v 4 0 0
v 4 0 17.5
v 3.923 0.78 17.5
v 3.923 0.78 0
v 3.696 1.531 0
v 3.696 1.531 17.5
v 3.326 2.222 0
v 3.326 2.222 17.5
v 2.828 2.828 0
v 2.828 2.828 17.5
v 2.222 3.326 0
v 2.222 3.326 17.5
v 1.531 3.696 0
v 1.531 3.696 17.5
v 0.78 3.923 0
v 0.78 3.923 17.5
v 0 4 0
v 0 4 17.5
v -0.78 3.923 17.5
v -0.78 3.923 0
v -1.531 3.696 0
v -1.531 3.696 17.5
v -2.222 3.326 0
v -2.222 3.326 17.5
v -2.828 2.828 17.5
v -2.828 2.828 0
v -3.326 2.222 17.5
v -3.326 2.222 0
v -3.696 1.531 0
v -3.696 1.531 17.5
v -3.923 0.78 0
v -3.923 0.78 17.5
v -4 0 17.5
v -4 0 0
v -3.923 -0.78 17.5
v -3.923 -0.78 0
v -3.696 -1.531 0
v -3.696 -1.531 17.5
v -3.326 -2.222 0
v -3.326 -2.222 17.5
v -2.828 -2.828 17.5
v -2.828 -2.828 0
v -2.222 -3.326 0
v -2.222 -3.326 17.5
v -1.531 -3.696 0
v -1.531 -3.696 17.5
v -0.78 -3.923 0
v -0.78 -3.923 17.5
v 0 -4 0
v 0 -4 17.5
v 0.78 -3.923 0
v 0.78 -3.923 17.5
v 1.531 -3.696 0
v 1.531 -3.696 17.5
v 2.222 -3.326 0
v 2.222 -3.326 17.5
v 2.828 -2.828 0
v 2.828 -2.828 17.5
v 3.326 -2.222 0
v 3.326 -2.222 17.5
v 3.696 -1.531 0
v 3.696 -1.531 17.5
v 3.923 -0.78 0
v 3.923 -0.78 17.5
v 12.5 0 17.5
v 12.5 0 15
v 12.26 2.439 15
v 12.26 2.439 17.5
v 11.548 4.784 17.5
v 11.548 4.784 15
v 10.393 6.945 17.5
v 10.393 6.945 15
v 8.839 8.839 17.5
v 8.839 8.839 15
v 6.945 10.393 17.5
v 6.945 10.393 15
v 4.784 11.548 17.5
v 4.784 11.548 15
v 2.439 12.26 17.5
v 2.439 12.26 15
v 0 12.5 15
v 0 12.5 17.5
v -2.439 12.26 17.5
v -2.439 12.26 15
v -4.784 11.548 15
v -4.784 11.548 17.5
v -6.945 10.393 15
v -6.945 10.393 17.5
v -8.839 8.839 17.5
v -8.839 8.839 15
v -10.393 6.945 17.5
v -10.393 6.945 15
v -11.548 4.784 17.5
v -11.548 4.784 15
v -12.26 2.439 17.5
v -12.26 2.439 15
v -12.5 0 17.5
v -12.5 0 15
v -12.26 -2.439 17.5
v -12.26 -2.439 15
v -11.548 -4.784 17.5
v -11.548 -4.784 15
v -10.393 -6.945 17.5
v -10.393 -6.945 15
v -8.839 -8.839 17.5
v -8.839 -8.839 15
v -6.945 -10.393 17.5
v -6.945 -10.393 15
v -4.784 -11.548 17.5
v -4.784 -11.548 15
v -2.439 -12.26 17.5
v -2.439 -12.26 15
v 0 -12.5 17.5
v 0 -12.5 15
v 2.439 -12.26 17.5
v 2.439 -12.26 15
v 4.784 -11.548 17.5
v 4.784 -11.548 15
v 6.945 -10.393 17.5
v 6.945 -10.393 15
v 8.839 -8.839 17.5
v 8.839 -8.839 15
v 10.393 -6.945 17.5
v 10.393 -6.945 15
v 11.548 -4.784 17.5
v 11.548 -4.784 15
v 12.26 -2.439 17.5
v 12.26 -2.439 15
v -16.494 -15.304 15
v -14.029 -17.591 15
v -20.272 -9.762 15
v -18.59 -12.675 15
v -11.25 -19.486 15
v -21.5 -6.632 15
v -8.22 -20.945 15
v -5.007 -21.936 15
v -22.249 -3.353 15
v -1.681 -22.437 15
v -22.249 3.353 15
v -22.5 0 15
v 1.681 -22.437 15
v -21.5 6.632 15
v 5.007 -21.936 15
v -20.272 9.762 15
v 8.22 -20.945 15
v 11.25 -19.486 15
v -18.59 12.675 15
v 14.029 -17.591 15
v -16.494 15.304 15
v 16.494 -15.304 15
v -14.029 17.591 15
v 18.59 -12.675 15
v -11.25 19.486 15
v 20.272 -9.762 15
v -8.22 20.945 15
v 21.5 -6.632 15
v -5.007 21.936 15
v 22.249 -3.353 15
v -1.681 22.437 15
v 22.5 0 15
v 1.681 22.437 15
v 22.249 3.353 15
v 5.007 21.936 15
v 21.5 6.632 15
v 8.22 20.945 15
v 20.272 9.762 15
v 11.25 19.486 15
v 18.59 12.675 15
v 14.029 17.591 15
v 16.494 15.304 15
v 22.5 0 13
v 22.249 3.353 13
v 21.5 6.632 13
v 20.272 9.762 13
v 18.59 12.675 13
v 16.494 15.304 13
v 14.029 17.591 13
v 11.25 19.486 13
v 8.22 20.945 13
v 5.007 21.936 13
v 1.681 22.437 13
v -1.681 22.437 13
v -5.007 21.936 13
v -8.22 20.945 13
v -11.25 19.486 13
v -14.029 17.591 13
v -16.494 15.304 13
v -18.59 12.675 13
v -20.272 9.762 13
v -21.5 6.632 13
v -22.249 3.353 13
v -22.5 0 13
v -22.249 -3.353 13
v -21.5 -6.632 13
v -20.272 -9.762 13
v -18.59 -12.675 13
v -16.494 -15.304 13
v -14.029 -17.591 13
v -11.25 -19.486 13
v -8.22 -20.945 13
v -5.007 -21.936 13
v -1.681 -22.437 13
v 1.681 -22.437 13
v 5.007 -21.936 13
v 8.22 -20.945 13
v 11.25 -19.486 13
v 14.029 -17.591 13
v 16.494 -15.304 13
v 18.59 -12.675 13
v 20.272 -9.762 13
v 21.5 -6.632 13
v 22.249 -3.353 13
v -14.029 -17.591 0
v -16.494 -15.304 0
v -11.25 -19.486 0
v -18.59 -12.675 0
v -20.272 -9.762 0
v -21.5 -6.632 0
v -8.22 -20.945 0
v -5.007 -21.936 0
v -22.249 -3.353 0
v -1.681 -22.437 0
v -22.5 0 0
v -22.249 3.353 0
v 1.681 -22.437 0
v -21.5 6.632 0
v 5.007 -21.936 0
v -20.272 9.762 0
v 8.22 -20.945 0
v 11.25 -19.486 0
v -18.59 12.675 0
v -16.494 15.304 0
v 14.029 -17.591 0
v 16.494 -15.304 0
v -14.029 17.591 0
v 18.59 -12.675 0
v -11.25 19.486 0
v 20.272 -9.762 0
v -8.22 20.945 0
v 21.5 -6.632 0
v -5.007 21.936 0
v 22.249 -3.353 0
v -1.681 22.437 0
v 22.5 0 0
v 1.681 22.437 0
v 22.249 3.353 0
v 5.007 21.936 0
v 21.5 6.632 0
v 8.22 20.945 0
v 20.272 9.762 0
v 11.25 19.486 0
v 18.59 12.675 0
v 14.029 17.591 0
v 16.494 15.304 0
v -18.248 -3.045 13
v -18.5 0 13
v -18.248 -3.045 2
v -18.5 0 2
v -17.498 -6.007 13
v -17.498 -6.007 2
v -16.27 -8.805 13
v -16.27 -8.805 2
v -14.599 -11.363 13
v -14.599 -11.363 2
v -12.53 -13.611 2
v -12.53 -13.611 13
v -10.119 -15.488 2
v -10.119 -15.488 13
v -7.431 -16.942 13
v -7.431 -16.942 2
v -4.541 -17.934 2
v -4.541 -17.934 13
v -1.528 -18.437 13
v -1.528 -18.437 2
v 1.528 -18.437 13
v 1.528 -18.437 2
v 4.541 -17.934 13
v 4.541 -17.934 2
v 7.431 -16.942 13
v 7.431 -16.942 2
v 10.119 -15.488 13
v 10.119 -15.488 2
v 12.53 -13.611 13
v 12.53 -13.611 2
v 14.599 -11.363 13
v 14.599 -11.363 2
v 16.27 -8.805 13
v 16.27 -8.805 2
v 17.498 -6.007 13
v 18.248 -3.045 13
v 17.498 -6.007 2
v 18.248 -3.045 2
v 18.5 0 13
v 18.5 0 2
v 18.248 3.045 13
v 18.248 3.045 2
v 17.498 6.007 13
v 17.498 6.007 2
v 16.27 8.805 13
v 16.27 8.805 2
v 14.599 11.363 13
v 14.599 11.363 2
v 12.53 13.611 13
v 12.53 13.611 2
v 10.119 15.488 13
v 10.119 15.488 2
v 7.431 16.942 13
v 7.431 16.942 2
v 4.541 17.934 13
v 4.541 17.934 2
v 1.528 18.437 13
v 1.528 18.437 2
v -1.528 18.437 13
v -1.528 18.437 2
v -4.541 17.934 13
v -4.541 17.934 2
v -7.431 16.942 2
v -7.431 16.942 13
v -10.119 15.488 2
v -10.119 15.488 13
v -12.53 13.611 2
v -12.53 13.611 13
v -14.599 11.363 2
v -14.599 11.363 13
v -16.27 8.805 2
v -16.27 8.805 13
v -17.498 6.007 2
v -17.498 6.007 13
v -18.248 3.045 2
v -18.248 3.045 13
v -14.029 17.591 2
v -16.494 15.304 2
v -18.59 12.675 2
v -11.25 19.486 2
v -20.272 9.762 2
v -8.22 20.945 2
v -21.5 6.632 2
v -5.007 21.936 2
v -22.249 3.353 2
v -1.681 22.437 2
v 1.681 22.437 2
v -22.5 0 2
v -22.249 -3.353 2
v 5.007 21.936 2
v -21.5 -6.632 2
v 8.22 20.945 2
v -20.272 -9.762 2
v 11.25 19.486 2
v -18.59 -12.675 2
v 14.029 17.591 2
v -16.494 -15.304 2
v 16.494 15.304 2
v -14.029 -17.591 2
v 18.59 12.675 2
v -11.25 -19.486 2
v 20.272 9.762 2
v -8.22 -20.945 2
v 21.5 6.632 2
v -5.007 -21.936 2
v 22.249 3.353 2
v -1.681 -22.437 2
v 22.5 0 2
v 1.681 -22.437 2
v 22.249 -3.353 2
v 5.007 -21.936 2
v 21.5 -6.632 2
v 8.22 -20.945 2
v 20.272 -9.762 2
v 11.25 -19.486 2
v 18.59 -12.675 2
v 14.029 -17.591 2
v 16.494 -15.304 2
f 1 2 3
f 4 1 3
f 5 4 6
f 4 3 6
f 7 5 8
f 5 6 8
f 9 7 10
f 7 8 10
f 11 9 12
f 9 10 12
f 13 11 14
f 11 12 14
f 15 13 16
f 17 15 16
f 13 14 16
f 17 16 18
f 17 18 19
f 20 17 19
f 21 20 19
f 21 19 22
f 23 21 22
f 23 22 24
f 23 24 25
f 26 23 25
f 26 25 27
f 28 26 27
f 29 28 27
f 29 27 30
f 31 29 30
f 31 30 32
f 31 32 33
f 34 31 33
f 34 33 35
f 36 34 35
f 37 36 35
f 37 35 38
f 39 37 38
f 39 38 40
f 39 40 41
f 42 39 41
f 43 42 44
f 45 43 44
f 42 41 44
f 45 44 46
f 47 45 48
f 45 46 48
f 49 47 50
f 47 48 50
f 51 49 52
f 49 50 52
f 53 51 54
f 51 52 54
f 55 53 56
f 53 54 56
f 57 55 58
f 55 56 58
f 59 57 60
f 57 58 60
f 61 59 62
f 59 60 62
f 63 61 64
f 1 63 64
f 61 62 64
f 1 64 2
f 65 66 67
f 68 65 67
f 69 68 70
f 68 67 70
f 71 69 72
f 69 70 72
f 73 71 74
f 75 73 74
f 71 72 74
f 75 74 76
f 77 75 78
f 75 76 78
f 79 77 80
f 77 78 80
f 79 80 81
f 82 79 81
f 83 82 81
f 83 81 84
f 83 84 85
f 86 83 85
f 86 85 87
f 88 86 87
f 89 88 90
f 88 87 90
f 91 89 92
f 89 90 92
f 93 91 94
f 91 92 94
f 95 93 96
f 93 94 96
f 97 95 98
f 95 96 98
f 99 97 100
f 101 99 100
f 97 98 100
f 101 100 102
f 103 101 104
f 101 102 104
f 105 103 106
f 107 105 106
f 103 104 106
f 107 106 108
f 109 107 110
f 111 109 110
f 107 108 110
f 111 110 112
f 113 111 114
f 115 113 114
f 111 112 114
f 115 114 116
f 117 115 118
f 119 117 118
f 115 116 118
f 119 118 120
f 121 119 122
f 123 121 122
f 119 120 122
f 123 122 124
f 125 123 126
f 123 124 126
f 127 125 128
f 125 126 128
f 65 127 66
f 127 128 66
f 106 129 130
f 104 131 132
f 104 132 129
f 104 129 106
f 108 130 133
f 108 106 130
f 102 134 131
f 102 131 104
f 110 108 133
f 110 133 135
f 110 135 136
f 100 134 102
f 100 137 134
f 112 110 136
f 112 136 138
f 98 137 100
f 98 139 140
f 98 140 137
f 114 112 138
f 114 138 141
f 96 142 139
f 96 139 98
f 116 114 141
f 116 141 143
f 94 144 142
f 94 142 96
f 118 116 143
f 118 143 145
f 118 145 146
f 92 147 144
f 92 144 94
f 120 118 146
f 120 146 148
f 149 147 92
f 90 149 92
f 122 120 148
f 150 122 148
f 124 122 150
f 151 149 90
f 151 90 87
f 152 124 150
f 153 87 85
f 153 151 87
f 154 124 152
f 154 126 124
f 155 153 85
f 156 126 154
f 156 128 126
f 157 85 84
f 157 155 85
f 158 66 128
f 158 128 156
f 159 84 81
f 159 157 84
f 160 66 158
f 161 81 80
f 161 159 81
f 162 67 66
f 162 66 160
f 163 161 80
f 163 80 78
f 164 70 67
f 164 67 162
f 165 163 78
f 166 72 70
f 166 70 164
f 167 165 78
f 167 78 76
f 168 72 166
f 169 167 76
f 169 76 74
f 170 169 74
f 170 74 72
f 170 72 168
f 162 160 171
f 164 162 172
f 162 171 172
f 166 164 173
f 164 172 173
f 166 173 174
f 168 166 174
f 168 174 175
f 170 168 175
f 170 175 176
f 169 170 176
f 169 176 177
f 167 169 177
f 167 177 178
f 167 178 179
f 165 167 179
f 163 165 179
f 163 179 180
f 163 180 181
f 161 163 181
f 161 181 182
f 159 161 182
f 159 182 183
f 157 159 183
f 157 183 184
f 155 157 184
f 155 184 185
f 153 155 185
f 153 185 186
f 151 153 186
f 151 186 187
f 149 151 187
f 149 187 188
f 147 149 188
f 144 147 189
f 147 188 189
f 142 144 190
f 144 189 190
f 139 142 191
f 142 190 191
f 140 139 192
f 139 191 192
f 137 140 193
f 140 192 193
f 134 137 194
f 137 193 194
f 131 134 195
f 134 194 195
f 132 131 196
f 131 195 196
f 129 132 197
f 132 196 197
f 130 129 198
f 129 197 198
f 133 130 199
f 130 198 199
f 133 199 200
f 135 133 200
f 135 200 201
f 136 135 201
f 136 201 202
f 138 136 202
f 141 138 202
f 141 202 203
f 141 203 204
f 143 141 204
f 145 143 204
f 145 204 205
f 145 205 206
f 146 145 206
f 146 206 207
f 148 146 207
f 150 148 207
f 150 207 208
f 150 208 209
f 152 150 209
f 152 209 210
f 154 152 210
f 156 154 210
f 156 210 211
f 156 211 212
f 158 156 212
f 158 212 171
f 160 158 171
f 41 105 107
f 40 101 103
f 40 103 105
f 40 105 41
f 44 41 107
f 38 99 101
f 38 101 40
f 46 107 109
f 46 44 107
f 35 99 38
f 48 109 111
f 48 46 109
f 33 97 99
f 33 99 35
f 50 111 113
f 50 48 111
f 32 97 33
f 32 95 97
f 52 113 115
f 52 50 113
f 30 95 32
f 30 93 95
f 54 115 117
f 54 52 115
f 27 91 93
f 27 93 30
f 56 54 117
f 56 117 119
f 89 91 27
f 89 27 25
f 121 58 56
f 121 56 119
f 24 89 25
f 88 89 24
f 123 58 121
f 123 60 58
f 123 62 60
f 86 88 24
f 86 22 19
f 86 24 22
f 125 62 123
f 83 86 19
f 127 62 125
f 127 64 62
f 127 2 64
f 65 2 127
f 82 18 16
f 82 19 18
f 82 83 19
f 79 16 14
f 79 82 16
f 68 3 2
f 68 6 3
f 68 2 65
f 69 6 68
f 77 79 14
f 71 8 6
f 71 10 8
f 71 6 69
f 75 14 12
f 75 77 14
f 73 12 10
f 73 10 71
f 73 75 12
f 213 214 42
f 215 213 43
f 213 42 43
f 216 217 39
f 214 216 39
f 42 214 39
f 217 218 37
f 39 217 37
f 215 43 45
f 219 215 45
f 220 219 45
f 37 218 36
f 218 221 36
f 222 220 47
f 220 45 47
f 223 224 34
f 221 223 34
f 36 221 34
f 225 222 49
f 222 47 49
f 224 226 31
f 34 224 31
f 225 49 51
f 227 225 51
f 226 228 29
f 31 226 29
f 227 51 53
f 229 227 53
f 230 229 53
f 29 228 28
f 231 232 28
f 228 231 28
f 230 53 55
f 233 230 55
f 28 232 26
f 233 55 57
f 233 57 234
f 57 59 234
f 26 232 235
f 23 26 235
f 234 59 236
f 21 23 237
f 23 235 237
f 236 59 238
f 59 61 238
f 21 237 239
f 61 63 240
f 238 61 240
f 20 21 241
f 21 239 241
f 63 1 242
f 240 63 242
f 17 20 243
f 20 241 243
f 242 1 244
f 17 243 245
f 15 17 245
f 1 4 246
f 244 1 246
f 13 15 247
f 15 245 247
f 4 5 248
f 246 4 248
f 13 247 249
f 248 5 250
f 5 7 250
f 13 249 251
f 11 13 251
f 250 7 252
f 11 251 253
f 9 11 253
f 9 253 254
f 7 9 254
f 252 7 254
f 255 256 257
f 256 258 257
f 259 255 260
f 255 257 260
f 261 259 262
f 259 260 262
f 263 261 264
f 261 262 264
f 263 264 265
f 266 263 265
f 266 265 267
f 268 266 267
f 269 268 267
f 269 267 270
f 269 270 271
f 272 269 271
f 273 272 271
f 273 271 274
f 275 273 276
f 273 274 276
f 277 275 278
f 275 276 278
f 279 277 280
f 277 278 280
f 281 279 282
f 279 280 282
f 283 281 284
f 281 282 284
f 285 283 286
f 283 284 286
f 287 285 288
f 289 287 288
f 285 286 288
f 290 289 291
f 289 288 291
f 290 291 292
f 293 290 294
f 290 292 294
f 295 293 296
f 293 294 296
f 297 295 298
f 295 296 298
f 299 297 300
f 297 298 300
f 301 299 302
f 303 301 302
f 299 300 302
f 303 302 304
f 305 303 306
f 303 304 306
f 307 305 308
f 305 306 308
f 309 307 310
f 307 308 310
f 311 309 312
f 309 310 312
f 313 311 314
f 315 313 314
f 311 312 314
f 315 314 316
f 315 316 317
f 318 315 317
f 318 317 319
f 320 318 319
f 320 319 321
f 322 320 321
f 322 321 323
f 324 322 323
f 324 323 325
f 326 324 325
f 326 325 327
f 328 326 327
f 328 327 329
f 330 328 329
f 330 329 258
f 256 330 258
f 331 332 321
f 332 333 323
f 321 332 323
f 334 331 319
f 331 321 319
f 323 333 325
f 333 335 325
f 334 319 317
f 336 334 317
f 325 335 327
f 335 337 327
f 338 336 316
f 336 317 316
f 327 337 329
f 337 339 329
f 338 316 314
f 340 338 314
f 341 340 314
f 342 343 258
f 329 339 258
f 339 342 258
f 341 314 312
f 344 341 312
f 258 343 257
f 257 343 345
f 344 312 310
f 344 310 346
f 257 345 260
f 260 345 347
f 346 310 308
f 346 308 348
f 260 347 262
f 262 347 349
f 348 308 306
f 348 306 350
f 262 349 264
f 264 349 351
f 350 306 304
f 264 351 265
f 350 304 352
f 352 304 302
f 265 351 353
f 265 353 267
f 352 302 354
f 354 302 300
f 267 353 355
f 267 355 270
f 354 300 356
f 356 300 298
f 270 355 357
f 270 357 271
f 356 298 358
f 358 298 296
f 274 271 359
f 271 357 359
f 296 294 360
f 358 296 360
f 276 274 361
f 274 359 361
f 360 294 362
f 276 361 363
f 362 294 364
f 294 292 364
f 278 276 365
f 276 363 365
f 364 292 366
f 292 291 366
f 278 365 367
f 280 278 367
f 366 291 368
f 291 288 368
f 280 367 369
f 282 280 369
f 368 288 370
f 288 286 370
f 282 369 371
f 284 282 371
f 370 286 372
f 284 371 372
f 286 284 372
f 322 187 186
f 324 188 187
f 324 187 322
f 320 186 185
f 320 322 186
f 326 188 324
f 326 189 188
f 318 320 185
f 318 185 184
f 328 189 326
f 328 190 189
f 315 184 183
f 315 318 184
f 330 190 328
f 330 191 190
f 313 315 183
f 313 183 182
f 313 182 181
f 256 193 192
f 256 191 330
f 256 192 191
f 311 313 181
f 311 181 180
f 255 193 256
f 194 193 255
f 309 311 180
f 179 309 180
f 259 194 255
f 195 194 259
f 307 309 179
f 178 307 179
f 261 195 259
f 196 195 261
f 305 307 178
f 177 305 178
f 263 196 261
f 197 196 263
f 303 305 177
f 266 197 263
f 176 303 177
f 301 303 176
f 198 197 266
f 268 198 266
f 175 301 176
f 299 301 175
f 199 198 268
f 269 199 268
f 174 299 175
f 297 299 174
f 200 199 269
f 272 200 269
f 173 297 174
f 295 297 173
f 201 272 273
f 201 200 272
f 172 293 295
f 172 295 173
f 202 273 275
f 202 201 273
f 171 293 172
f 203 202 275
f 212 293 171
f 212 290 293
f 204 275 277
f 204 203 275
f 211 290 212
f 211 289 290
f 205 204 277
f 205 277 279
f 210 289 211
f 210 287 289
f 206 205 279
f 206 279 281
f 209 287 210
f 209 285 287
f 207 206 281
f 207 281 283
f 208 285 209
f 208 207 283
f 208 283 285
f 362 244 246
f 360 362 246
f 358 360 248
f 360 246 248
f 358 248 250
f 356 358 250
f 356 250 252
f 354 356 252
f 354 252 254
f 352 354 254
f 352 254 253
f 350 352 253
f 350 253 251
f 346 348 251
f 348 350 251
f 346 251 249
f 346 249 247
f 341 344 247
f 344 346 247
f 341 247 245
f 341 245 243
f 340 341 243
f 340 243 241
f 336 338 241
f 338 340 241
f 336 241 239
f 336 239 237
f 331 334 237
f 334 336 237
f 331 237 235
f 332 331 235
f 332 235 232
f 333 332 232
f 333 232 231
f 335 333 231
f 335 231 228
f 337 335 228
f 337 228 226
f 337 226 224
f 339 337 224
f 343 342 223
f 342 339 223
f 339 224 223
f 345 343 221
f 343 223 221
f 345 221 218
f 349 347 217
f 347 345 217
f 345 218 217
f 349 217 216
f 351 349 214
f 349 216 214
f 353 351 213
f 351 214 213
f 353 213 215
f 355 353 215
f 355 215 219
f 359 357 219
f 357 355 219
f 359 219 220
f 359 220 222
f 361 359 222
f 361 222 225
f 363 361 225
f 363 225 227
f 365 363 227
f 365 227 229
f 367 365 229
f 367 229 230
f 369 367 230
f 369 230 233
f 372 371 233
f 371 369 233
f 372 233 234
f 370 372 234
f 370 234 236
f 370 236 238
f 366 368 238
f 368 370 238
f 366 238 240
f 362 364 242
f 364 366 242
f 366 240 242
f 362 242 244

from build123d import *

# Parameters (mm, degrees)
SKETCH_1_R          = 22.5
EXTRUDE_1_DEPTH     = 15
SKETCH_2_R          = 12.5
EXTRUDE_2_DEPTH     = 2.5
SKETCH_3_R          = 4
CUT_EXTRUDE_1_DEPTH = 45
SKETCH_5_W          = 4
SKETCH_5_H          = 11


with BuildPart() as part:
    # 草图1 → 凸台-拉伸1 (new body)
    with BuildSketch(Plane.XY):
        Circle(SKETCH_1_R)
    extrude(amount=EXTRUDE_1_DEPTH)

    # 草图2 → 凸台-拉伸2 (add)
    with BuildSketch(Plane.XY.offset(15)):
        Circle(SKETCH_2_R)
    extrude(amount=EXTRUDE_2_DEPTH)

    # 草图3 → 切除-拉伸1 (cut)
    with BuildSketch(Plane.XY.offset(17.5)):
        Circle(SKETCH_3_R)
    extrude(amount=-CUT_EXTRUDE_1_DEPTH, mode=Mode.SUBTRACT)

    # 草图5 → 切除-旋转1 (revolve, cut)
    with BuildSketch(Plane(origin=(0, 0, 0), x_dir=(1, 0, 0), z_dir=(0, 1, 0)), mode=Mode.PRIVATE) as cut_revolve_1_sk:
        with Locations((20.5, -7.5)):
            Rectangle(SKETCH_5_W, SKETCH_5_H)
    revolve(cut_revolve_1_sk.sketch.rotate(Axis((0, 0, 0), (0, 0, 1)), 180), axis=Axis((0, 0, 0), (0, 0, 1)), mode=Mode.SUBTRACT)


solid = part.part
